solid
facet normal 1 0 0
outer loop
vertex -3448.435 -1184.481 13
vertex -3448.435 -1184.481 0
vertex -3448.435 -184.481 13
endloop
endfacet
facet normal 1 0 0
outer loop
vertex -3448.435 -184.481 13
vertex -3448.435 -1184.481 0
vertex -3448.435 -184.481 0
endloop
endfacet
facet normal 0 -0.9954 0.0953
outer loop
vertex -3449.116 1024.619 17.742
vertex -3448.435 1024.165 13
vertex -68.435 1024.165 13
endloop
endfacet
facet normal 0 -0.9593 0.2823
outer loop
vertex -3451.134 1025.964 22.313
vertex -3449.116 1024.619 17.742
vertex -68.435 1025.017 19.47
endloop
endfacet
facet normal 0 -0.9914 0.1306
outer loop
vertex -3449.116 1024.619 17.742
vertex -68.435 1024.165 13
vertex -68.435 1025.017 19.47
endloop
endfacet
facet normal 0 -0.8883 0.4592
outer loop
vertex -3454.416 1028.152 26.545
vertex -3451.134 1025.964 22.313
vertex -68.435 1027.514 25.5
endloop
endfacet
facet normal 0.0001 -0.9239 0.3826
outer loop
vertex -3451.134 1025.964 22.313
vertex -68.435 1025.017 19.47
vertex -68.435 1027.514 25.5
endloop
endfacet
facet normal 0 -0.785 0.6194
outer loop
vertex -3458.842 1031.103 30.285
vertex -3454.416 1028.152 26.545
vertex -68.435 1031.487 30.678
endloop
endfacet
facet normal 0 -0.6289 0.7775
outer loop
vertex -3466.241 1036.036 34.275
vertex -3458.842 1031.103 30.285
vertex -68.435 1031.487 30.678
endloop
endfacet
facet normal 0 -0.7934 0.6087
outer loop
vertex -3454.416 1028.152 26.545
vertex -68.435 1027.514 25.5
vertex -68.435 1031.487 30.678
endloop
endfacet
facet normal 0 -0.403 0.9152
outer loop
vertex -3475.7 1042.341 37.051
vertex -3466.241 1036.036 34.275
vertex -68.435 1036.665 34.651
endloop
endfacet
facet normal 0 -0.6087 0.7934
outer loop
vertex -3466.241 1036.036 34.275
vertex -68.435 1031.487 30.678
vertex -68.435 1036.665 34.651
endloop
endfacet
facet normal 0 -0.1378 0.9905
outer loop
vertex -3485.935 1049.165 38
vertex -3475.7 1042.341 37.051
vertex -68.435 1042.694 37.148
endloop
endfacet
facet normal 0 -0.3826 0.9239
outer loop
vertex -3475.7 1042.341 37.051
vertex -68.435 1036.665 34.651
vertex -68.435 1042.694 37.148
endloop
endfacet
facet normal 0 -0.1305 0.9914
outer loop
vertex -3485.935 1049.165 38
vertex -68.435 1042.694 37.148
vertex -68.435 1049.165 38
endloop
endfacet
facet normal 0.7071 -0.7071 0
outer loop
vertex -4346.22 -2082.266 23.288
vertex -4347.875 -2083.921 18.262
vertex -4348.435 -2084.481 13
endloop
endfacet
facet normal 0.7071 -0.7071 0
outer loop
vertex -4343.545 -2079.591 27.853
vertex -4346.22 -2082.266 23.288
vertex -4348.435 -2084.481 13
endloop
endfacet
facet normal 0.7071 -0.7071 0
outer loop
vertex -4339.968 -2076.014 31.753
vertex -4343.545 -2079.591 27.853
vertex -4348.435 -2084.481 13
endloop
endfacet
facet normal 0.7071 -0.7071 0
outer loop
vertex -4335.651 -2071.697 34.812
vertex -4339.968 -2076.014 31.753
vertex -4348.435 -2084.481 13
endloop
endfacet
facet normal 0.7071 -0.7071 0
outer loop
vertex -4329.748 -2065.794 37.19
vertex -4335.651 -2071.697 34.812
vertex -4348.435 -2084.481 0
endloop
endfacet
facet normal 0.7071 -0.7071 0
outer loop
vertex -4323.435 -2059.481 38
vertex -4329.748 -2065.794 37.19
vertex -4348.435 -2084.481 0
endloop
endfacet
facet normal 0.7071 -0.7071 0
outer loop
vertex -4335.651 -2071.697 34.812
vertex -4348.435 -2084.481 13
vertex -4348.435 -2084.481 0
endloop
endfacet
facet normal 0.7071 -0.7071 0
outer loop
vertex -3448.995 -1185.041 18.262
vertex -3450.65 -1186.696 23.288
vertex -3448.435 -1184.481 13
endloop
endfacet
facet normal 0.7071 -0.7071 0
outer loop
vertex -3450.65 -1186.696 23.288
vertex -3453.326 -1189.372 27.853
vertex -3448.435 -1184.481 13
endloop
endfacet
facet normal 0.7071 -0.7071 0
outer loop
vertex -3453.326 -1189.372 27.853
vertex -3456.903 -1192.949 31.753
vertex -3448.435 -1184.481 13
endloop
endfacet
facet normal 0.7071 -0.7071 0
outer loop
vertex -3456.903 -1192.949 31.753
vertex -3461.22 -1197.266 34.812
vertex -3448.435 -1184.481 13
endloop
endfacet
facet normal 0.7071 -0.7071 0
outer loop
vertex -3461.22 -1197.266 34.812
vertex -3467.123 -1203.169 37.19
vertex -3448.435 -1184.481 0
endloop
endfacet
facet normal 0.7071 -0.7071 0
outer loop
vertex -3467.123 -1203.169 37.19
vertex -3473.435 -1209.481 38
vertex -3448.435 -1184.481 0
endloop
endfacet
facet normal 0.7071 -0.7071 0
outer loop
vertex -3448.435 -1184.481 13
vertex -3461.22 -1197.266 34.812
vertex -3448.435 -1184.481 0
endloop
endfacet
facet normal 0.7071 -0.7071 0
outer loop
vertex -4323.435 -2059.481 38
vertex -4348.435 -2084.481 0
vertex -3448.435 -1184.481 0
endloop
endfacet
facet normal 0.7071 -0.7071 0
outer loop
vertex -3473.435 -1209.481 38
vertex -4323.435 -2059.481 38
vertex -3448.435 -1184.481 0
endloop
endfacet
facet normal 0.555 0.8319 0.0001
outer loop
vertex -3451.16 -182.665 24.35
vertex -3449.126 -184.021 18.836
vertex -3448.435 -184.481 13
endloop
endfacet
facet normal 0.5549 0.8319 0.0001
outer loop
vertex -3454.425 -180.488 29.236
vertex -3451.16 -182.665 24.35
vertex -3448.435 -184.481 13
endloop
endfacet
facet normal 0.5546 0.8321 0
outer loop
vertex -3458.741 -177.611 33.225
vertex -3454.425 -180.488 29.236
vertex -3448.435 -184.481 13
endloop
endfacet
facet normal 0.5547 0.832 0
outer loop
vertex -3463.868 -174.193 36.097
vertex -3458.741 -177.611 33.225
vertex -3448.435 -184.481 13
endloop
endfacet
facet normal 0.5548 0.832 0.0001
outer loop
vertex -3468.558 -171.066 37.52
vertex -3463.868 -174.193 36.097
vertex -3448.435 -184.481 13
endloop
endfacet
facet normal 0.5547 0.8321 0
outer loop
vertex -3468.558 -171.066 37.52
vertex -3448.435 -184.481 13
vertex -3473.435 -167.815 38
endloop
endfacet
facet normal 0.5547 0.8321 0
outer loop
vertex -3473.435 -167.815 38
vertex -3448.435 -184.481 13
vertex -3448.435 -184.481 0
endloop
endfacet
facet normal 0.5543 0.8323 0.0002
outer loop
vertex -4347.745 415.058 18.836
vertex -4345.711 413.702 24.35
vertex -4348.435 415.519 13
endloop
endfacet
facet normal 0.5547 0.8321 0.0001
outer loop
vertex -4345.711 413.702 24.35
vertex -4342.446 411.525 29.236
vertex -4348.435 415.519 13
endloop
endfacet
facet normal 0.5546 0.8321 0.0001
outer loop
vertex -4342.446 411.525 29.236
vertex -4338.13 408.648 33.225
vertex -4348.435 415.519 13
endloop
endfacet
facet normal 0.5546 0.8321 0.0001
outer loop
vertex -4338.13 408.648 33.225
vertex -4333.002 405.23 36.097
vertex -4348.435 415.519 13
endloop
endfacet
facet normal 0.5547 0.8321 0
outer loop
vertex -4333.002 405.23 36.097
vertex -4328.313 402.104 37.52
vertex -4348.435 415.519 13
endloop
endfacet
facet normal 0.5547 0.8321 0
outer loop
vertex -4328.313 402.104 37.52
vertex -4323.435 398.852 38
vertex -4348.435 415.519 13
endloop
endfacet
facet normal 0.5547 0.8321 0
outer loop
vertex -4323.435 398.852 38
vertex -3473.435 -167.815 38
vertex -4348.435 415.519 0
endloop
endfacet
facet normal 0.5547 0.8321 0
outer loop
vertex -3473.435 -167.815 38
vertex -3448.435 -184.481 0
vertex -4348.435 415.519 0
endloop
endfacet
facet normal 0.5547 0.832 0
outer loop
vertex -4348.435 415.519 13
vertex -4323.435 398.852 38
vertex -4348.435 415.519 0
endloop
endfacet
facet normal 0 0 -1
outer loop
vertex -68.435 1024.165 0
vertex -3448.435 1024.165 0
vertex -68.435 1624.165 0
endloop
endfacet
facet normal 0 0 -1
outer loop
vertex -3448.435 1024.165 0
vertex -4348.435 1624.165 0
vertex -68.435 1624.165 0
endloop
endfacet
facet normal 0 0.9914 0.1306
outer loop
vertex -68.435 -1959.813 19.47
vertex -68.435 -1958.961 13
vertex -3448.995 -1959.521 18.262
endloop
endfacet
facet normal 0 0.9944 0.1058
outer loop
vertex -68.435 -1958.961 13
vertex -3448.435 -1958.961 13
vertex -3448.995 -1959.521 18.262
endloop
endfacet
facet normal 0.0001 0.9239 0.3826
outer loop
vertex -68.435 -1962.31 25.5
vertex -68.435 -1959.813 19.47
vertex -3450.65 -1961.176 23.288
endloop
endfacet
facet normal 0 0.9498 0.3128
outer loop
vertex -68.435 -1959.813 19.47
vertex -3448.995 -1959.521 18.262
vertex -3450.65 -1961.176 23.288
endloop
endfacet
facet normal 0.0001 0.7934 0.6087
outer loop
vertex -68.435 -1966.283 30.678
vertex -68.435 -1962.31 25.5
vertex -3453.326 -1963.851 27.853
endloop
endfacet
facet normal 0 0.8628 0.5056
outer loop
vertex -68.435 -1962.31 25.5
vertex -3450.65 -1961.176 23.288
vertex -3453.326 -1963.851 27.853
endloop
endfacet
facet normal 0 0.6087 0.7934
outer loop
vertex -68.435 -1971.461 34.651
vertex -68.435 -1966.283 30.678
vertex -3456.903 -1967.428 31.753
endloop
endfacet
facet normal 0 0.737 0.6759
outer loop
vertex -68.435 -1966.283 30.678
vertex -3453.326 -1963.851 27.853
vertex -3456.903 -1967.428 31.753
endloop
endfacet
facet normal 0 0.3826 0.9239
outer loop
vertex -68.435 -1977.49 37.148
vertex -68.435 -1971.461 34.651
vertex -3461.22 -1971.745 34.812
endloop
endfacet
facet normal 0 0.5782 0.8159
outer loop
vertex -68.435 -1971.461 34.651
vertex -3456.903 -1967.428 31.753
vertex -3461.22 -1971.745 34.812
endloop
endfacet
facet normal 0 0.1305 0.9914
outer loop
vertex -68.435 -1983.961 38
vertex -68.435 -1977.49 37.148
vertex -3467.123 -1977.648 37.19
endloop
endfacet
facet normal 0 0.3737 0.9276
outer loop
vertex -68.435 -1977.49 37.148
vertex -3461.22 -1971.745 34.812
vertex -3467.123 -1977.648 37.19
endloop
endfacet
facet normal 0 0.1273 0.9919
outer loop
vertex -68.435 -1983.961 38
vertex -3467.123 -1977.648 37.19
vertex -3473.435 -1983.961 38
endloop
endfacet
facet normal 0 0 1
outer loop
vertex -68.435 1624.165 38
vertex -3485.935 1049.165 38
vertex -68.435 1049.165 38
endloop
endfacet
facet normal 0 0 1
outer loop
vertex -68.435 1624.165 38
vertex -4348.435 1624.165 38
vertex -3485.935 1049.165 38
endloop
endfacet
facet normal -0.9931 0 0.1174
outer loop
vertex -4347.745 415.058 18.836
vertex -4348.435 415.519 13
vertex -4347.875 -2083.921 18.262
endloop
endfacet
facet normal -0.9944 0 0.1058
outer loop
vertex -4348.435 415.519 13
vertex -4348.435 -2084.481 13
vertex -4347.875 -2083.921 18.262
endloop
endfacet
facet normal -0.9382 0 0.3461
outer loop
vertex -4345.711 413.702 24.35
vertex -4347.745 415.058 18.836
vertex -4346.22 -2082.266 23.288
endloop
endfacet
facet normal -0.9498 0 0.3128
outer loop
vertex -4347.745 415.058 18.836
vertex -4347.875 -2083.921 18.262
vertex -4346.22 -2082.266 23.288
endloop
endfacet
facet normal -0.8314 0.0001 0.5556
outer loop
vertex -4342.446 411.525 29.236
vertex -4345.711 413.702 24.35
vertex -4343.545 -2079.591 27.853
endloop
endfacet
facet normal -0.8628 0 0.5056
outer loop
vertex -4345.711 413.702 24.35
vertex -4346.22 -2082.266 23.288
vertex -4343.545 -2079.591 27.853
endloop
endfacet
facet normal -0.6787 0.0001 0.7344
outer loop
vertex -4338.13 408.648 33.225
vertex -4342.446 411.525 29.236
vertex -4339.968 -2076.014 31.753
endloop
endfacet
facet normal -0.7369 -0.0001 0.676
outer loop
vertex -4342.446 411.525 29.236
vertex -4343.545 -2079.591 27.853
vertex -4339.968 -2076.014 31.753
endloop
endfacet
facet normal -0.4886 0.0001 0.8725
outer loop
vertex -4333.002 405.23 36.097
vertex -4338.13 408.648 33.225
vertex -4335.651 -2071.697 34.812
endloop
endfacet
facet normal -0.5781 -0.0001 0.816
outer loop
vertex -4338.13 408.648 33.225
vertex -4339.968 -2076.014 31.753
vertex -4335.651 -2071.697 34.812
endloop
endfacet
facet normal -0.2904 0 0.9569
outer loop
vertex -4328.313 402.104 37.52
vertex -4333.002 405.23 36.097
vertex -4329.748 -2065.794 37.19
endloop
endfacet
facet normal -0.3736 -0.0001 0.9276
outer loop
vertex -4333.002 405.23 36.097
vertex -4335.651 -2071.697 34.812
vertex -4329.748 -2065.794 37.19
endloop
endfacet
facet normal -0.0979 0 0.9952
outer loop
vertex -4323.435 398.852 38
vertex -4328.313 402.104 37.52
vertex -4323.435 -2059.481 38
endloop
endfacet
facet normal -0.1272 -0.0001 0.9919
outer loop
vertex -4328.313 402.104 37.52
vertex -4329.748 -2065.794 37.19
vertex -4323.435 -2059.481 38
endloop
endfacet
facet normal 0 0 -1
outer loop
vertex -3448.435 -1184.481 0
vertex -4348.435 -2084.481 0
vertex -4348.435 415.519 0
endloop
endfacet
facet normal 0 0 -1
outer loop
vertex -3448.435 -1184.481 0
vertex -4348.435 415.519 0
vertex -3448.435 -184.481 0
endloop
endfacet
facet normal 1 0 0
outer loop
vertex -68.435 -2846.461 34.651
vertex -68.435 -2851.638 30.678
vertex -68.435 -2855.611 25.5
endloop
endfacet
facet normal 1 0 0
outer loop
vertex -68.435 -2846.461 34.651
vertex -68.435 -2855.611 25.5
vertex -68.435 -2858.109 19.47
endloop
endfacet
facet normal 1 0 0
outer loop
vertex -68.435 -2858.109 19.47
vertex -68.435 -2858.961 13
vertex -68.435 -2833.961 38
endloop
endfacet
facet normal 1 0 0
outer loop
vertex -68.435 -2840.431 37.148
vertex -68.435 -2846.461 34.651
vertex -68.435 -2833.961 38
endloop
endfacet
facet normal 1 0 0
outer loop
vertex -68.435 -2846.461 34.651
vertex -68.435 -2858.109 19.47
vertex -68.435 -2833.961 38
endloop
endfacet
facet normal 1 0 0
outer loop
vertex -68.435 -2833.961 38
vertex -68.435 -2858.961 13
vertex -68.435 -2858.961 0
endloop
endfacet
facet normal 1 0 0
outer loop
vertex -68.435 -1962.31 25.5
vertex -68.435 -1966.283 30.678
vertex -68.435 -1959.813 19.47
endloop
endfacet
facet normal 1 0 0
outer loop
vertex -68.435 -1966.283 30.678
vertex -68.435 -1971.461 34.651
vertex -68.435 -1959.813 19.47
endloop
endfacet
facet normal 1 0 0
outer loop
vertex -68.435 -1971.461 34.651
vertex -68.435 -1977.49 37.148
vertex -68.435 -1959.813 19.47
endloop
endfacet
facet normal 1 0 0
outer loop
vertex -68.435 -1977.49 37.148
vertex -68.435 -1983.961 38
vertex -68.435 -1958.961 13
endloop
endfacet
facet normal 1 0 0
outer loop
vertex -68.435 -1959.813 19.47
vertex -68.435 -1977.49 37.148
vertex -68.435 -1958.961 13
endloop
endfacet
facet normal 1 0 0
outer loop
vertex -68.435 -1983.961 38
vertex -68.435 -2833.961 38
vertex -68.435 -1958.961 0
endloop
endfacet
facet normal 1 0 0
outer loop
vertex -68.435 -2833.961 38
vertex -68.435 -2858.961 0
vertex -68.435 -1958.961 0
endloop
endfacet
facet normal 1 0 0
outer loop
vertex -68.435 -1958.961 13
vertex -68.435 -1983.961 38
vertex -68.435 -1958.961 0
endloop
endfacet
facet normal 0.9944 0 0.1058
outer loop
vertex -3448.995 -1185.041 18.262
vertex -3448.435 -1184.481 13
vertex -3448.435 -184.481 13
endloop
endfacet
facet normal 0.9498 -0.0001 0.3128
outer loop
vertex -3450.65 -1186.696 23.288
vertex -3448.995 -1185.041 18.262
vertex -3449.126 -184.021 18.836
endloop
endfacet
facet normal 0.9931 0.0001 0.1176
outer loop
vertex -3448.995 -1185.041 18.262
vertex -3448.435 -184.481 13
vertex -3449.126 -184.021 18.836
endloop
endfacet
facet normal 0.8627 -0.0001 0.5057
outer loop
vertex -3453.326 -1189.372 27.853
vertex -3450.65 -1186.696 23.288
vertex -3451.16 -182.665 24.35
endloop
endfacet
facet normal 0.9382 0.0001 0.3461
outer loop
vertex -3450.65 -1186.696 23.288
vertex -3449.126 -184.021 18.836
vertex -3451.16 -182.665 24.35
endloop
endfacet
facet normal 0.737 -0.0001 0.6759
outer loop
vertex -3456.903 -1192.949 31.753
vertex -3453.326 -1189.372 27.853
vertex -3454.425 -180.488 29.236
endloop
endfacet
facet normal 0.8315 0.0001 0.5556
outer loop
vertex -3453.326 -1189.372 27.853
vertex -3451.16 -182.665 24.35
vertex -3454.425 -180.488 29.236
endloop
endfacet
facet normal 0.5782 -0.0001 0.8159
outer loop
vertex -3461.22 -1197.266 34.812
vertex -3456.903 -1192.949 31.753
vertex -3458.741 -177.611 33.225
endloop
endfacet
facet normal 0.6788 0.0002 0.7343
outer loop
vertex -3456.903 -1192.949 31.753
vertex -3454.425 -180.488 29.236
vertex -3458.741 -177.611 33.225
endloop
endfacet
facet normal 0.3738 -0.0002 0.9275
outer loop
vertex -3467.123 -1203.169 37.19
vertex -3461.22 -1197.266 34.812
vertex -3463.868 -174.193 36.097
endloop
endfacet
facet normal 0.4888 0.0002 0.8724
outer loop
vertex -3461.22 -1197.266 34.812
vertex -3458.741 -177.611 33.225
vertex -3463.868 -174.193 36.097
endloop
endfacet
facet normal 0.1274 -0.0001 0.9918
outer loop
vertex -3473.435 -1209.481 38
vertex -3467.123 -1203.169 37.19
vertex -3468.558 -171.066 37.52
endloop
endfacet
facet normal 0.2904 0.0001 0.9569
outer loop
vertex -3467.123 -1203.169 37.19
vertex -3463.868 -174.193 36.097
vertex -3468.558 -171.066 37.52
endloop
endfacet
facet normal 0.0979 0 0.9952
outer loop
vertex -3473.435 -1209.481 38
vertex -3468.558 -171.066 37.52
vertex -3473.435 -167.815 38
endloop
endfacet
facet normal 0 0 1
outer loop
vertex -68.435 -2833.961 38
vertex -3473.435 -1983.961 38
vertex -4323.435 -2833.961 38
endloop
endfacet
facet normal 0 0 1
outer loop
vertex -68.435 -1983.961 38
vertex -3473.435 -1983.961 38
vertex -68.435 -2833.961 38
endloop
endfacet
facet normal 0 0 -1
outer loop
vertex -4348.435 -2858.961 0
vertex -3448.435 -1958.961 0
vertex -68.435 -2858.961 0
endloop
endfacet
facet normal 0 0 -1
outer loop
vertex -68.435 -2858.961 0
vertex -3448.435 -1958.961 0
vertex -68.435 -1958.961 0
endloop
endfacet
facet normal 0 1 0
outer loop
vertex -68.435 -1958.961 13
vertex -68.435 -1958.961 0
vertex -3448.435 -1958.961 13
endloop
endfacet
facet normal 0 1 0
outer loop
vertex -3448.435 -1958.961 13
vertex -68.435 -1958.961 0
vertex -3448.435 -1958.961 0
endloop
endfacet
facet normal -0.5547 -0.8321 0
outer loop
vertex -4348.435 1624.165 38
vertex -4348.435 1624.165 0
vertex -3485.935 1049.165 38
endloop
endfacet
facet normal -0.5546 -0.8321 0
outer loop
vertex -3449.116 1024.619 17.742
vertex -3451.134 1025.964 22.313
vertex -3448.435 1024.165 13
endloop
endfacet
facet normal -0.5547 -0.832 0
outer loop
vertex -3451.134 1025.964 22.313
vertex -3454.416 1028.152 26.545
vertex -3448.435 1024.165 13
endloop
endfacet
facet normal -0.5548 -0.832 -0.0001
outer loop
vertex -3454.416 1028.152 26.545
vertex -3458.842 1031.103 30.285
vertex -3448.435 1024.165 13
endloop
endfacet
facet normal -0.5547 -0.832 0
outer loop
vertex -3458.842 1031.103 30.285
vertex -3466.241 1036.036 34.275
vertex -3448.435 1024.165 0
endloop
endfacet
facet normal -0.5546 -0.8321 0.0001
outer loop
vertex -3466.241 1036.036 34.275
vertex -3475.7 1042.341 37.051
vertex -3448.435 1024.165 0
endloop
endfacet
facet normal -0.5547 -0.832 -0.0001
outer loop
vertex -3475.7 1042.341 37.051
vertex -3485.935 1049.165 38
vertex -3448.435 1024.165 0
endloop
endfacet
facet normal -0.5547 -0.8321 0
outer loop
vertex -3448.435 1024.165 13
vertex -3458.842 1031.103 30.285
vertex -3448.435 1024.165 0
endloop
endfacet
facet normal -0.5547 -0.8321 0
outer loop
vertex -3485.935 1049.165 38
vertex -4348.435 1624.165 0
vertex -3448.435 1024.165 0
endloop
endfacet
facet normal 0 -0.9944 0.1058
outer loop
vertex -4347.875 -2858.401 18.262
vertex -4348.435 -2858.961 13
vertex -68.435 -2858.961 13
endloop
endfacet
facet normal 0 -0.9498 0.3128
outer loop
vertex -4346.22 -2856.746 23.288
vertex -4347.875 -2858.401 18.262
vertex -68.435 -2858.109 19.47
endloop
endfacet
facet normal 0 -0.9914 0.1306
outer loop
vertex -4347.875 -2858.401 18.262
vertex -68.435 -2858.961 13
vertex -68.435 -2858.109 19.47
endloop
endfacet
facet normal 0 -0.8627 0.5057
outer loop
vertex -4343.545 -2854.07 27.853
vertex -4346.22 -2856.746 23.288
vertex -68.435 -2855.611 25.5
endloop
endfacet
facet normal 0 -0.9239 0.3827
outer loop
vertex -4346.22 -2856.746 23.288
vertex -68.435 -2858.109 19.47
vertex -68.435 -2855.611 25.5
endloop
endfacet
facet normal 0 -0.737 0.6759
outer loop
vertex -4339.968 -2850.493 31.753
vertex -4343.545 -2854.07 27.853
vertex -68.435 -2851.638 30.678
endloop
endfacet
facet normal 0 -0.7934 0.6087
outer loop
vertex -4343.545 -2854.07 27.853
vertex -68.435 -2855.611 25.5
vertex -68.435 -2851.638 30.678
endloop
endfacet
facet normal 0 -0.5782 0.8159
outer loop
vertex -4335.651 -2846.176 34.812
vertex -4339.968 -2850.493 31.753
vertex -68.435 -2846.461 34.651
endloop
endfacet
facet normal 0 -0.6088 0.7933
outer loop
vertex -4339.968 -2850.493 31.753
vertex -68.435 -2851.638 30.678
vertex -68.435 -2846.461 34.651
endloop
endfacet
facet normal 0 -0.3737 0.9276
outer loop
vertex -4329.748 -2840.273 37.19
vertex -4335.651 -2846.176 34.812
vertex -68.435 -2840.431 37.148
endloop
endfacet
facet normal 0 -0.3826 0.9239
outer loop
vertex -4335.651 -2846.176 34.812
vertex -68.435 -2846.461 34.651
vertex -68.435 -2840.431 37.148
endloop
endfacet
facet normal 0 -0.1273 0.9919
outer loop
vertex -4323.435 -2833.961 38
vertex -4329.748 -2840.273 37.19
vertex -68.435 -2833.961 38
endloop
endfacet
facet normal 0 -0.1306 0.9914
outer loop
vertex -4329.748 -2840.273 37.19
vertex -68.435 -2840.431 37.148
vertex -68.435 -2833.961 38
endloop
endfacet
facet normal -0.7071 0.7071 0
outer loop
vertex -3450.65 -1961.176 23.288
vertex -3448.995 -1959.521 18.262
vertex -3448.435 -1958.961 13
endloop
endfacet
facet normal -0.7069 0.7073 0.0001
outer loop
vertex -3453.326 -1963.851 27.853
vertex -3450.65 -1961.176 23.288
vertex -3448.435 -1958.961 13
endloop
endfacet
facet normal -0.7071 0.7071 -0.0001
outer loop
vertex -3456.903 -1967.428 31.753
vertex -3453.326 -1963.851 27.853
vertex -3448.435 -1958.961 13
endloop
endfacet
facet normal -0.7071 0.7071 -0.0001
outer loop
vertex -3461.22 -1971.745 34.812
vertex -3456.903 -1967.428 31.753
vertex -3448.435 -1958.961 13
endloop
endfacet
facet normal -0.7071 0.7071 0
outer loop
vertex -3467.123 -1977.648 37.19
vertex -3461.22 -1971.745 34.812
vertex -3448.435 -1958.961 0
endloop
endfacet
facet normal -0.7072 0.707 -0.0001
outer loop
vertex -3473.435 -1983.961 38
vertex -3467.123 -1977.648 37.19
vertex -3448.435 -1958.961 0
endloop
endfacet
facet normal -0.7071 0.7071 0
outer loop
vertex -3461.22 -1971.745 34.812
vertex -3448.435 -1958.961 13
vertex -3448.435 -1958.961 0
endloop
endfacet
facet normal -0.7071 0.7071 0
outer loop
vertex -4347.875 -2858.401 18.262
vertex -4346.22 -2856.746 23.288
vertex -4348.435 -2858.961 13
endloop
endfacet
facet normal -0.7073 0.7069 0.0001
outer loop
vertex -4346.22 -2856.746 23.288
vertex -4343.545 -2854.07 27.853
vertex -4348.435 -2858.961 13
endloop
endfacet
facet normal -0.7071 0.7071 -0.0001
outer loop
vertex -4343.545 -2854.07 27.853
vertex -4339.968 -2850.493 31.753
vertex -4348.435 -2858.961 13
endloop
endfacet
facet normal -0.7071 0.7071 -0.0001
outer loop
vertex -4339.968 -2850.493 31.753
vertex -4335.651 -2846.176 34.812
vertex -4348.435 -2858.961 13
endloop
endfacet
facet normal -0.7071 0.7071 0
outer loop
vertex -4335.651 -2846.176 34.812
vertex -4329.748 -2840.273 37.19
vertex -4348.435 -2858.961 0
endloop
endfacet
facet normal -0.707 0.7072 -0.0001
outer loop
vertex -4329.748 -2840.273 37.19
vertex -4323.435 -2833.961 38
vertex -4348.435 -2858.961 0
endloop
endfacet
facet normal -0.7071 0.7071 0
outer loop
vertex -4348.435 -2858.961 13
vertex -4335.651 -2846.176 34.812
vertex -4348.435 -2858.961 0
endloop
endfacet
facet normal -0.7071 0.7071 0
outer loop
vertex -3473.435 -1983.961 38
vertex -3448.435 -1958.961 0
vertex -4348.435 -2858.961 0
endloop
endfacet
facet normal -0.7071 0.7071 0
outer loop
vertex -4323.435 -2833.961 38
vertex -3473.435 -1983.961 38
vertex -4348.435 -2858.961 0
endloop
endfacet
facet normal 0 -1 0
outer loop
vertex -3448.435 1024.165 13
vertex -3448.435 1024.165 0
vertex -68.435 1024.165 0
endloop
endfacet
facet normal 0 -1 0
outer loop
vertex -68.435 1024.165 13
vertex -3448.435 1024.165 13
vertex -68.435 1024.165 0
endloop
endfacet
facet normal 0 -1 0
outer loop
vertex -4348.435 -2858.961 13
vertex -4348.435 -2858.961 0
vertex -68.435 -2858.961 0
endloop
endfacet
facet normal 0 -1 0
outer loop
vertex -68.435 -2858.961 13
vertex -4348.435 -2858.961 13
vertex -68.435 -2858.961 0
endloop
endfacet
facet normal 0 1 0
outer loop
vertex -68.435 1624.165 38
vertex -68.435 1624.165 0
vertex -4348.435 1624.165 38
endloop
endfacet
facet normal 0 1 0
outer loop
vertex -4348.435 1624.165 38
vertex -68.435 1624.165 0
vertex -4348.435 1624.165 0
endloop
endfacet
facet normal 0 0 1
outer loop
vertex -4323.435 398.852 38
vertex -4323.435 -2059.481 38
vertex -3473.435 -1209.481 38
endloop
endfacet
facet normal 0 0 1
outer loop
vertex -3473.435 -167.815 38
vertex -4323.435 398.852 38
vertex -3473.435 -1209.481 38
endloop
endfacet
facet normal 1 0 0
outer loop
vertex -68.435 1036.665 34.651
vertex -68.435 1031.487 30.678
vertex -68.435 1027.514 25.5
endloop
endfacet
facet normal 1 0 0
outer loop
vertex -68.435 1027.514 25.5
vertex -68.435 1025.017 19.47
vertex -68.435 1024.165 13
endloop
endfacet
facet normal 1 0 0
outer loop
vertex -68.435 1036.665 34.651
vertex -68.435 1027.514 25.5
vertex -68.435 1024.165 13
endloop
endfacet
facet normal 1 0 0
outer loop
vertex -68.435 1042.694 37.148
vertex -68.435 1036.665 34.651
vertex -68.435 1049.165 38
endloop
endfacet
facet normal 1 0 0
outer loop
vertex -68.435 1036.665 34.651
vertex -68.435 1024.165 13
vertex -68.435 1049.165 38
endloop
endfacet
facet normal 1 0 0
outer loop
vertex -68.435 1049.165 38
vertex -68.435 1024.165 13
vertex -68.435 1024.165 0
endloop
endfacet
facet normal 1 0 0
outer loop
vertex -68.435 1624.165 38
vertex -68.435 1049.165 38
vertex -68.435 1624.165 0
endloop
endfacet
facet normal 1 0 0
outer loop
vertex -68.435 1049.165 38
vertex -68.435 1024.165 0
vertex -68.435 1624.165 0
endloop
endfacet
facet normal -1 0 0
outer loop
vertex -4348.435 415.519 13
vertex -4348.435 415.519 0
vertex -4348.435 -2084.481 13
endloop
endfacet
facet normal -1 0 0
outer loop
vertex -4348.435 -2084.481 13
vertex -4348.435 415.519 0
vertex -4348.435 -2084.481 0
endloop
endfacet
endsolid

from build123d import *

# Parameters (mm, degrees)
F1_DEPTH = 38
F2_R     = 25
F3_R     = 25
F4_R     = 25


with BuildPart() as f1:
    # F0 (on Top) → F1 (new body)
    with BuildSketch(Plane.XY):
        Polygon((-4348.435363, 1624.164917), (-3448.435363, 1024.164917), (-68.435363, 1024.164917), (-68.435363, 1624.164917), align=None)
        Polygon((-4348.435363, 415.51868), (-4348.435363, -2084.48132), (-3448.435363, -1184.48132), (-3448.435363, -184.48132), align=None)
        Polygon((-3448.435363, -1958.960673), (-4348.435363, -2858.960673), (-68.435363, -2858.960673), (-68.435363, -1958.960673), align=None)
    extrude(amount=F1_DEPTH)

    # F2
    f2_edges = [f1.edges().sort_by_distance(p)[0] for p in [
        (-1758.435363, 1024.164917, 38),
    ]]
    fillet(f2_edges, radius=F2_R)

    # F3
    f3_edges = [f1.edges().sort_by_distance(p)[0] for p in [
        (-3448.435363, -684.48132, 38),
        (-4348.435363, -834.48132, 38),
    ]]
    fillet(f3_edges, radius=F3_R)

    # F4
    f4_edges = [f1.edges().sort_by_distance(p)[0] for p in [
        (-2208.435363, -2858.960673, 38),
        (-1758.435363, -1958.960673, 38),
    ]]
    fillet(f4_edges, radius=F4_R)


solid = f1.part
